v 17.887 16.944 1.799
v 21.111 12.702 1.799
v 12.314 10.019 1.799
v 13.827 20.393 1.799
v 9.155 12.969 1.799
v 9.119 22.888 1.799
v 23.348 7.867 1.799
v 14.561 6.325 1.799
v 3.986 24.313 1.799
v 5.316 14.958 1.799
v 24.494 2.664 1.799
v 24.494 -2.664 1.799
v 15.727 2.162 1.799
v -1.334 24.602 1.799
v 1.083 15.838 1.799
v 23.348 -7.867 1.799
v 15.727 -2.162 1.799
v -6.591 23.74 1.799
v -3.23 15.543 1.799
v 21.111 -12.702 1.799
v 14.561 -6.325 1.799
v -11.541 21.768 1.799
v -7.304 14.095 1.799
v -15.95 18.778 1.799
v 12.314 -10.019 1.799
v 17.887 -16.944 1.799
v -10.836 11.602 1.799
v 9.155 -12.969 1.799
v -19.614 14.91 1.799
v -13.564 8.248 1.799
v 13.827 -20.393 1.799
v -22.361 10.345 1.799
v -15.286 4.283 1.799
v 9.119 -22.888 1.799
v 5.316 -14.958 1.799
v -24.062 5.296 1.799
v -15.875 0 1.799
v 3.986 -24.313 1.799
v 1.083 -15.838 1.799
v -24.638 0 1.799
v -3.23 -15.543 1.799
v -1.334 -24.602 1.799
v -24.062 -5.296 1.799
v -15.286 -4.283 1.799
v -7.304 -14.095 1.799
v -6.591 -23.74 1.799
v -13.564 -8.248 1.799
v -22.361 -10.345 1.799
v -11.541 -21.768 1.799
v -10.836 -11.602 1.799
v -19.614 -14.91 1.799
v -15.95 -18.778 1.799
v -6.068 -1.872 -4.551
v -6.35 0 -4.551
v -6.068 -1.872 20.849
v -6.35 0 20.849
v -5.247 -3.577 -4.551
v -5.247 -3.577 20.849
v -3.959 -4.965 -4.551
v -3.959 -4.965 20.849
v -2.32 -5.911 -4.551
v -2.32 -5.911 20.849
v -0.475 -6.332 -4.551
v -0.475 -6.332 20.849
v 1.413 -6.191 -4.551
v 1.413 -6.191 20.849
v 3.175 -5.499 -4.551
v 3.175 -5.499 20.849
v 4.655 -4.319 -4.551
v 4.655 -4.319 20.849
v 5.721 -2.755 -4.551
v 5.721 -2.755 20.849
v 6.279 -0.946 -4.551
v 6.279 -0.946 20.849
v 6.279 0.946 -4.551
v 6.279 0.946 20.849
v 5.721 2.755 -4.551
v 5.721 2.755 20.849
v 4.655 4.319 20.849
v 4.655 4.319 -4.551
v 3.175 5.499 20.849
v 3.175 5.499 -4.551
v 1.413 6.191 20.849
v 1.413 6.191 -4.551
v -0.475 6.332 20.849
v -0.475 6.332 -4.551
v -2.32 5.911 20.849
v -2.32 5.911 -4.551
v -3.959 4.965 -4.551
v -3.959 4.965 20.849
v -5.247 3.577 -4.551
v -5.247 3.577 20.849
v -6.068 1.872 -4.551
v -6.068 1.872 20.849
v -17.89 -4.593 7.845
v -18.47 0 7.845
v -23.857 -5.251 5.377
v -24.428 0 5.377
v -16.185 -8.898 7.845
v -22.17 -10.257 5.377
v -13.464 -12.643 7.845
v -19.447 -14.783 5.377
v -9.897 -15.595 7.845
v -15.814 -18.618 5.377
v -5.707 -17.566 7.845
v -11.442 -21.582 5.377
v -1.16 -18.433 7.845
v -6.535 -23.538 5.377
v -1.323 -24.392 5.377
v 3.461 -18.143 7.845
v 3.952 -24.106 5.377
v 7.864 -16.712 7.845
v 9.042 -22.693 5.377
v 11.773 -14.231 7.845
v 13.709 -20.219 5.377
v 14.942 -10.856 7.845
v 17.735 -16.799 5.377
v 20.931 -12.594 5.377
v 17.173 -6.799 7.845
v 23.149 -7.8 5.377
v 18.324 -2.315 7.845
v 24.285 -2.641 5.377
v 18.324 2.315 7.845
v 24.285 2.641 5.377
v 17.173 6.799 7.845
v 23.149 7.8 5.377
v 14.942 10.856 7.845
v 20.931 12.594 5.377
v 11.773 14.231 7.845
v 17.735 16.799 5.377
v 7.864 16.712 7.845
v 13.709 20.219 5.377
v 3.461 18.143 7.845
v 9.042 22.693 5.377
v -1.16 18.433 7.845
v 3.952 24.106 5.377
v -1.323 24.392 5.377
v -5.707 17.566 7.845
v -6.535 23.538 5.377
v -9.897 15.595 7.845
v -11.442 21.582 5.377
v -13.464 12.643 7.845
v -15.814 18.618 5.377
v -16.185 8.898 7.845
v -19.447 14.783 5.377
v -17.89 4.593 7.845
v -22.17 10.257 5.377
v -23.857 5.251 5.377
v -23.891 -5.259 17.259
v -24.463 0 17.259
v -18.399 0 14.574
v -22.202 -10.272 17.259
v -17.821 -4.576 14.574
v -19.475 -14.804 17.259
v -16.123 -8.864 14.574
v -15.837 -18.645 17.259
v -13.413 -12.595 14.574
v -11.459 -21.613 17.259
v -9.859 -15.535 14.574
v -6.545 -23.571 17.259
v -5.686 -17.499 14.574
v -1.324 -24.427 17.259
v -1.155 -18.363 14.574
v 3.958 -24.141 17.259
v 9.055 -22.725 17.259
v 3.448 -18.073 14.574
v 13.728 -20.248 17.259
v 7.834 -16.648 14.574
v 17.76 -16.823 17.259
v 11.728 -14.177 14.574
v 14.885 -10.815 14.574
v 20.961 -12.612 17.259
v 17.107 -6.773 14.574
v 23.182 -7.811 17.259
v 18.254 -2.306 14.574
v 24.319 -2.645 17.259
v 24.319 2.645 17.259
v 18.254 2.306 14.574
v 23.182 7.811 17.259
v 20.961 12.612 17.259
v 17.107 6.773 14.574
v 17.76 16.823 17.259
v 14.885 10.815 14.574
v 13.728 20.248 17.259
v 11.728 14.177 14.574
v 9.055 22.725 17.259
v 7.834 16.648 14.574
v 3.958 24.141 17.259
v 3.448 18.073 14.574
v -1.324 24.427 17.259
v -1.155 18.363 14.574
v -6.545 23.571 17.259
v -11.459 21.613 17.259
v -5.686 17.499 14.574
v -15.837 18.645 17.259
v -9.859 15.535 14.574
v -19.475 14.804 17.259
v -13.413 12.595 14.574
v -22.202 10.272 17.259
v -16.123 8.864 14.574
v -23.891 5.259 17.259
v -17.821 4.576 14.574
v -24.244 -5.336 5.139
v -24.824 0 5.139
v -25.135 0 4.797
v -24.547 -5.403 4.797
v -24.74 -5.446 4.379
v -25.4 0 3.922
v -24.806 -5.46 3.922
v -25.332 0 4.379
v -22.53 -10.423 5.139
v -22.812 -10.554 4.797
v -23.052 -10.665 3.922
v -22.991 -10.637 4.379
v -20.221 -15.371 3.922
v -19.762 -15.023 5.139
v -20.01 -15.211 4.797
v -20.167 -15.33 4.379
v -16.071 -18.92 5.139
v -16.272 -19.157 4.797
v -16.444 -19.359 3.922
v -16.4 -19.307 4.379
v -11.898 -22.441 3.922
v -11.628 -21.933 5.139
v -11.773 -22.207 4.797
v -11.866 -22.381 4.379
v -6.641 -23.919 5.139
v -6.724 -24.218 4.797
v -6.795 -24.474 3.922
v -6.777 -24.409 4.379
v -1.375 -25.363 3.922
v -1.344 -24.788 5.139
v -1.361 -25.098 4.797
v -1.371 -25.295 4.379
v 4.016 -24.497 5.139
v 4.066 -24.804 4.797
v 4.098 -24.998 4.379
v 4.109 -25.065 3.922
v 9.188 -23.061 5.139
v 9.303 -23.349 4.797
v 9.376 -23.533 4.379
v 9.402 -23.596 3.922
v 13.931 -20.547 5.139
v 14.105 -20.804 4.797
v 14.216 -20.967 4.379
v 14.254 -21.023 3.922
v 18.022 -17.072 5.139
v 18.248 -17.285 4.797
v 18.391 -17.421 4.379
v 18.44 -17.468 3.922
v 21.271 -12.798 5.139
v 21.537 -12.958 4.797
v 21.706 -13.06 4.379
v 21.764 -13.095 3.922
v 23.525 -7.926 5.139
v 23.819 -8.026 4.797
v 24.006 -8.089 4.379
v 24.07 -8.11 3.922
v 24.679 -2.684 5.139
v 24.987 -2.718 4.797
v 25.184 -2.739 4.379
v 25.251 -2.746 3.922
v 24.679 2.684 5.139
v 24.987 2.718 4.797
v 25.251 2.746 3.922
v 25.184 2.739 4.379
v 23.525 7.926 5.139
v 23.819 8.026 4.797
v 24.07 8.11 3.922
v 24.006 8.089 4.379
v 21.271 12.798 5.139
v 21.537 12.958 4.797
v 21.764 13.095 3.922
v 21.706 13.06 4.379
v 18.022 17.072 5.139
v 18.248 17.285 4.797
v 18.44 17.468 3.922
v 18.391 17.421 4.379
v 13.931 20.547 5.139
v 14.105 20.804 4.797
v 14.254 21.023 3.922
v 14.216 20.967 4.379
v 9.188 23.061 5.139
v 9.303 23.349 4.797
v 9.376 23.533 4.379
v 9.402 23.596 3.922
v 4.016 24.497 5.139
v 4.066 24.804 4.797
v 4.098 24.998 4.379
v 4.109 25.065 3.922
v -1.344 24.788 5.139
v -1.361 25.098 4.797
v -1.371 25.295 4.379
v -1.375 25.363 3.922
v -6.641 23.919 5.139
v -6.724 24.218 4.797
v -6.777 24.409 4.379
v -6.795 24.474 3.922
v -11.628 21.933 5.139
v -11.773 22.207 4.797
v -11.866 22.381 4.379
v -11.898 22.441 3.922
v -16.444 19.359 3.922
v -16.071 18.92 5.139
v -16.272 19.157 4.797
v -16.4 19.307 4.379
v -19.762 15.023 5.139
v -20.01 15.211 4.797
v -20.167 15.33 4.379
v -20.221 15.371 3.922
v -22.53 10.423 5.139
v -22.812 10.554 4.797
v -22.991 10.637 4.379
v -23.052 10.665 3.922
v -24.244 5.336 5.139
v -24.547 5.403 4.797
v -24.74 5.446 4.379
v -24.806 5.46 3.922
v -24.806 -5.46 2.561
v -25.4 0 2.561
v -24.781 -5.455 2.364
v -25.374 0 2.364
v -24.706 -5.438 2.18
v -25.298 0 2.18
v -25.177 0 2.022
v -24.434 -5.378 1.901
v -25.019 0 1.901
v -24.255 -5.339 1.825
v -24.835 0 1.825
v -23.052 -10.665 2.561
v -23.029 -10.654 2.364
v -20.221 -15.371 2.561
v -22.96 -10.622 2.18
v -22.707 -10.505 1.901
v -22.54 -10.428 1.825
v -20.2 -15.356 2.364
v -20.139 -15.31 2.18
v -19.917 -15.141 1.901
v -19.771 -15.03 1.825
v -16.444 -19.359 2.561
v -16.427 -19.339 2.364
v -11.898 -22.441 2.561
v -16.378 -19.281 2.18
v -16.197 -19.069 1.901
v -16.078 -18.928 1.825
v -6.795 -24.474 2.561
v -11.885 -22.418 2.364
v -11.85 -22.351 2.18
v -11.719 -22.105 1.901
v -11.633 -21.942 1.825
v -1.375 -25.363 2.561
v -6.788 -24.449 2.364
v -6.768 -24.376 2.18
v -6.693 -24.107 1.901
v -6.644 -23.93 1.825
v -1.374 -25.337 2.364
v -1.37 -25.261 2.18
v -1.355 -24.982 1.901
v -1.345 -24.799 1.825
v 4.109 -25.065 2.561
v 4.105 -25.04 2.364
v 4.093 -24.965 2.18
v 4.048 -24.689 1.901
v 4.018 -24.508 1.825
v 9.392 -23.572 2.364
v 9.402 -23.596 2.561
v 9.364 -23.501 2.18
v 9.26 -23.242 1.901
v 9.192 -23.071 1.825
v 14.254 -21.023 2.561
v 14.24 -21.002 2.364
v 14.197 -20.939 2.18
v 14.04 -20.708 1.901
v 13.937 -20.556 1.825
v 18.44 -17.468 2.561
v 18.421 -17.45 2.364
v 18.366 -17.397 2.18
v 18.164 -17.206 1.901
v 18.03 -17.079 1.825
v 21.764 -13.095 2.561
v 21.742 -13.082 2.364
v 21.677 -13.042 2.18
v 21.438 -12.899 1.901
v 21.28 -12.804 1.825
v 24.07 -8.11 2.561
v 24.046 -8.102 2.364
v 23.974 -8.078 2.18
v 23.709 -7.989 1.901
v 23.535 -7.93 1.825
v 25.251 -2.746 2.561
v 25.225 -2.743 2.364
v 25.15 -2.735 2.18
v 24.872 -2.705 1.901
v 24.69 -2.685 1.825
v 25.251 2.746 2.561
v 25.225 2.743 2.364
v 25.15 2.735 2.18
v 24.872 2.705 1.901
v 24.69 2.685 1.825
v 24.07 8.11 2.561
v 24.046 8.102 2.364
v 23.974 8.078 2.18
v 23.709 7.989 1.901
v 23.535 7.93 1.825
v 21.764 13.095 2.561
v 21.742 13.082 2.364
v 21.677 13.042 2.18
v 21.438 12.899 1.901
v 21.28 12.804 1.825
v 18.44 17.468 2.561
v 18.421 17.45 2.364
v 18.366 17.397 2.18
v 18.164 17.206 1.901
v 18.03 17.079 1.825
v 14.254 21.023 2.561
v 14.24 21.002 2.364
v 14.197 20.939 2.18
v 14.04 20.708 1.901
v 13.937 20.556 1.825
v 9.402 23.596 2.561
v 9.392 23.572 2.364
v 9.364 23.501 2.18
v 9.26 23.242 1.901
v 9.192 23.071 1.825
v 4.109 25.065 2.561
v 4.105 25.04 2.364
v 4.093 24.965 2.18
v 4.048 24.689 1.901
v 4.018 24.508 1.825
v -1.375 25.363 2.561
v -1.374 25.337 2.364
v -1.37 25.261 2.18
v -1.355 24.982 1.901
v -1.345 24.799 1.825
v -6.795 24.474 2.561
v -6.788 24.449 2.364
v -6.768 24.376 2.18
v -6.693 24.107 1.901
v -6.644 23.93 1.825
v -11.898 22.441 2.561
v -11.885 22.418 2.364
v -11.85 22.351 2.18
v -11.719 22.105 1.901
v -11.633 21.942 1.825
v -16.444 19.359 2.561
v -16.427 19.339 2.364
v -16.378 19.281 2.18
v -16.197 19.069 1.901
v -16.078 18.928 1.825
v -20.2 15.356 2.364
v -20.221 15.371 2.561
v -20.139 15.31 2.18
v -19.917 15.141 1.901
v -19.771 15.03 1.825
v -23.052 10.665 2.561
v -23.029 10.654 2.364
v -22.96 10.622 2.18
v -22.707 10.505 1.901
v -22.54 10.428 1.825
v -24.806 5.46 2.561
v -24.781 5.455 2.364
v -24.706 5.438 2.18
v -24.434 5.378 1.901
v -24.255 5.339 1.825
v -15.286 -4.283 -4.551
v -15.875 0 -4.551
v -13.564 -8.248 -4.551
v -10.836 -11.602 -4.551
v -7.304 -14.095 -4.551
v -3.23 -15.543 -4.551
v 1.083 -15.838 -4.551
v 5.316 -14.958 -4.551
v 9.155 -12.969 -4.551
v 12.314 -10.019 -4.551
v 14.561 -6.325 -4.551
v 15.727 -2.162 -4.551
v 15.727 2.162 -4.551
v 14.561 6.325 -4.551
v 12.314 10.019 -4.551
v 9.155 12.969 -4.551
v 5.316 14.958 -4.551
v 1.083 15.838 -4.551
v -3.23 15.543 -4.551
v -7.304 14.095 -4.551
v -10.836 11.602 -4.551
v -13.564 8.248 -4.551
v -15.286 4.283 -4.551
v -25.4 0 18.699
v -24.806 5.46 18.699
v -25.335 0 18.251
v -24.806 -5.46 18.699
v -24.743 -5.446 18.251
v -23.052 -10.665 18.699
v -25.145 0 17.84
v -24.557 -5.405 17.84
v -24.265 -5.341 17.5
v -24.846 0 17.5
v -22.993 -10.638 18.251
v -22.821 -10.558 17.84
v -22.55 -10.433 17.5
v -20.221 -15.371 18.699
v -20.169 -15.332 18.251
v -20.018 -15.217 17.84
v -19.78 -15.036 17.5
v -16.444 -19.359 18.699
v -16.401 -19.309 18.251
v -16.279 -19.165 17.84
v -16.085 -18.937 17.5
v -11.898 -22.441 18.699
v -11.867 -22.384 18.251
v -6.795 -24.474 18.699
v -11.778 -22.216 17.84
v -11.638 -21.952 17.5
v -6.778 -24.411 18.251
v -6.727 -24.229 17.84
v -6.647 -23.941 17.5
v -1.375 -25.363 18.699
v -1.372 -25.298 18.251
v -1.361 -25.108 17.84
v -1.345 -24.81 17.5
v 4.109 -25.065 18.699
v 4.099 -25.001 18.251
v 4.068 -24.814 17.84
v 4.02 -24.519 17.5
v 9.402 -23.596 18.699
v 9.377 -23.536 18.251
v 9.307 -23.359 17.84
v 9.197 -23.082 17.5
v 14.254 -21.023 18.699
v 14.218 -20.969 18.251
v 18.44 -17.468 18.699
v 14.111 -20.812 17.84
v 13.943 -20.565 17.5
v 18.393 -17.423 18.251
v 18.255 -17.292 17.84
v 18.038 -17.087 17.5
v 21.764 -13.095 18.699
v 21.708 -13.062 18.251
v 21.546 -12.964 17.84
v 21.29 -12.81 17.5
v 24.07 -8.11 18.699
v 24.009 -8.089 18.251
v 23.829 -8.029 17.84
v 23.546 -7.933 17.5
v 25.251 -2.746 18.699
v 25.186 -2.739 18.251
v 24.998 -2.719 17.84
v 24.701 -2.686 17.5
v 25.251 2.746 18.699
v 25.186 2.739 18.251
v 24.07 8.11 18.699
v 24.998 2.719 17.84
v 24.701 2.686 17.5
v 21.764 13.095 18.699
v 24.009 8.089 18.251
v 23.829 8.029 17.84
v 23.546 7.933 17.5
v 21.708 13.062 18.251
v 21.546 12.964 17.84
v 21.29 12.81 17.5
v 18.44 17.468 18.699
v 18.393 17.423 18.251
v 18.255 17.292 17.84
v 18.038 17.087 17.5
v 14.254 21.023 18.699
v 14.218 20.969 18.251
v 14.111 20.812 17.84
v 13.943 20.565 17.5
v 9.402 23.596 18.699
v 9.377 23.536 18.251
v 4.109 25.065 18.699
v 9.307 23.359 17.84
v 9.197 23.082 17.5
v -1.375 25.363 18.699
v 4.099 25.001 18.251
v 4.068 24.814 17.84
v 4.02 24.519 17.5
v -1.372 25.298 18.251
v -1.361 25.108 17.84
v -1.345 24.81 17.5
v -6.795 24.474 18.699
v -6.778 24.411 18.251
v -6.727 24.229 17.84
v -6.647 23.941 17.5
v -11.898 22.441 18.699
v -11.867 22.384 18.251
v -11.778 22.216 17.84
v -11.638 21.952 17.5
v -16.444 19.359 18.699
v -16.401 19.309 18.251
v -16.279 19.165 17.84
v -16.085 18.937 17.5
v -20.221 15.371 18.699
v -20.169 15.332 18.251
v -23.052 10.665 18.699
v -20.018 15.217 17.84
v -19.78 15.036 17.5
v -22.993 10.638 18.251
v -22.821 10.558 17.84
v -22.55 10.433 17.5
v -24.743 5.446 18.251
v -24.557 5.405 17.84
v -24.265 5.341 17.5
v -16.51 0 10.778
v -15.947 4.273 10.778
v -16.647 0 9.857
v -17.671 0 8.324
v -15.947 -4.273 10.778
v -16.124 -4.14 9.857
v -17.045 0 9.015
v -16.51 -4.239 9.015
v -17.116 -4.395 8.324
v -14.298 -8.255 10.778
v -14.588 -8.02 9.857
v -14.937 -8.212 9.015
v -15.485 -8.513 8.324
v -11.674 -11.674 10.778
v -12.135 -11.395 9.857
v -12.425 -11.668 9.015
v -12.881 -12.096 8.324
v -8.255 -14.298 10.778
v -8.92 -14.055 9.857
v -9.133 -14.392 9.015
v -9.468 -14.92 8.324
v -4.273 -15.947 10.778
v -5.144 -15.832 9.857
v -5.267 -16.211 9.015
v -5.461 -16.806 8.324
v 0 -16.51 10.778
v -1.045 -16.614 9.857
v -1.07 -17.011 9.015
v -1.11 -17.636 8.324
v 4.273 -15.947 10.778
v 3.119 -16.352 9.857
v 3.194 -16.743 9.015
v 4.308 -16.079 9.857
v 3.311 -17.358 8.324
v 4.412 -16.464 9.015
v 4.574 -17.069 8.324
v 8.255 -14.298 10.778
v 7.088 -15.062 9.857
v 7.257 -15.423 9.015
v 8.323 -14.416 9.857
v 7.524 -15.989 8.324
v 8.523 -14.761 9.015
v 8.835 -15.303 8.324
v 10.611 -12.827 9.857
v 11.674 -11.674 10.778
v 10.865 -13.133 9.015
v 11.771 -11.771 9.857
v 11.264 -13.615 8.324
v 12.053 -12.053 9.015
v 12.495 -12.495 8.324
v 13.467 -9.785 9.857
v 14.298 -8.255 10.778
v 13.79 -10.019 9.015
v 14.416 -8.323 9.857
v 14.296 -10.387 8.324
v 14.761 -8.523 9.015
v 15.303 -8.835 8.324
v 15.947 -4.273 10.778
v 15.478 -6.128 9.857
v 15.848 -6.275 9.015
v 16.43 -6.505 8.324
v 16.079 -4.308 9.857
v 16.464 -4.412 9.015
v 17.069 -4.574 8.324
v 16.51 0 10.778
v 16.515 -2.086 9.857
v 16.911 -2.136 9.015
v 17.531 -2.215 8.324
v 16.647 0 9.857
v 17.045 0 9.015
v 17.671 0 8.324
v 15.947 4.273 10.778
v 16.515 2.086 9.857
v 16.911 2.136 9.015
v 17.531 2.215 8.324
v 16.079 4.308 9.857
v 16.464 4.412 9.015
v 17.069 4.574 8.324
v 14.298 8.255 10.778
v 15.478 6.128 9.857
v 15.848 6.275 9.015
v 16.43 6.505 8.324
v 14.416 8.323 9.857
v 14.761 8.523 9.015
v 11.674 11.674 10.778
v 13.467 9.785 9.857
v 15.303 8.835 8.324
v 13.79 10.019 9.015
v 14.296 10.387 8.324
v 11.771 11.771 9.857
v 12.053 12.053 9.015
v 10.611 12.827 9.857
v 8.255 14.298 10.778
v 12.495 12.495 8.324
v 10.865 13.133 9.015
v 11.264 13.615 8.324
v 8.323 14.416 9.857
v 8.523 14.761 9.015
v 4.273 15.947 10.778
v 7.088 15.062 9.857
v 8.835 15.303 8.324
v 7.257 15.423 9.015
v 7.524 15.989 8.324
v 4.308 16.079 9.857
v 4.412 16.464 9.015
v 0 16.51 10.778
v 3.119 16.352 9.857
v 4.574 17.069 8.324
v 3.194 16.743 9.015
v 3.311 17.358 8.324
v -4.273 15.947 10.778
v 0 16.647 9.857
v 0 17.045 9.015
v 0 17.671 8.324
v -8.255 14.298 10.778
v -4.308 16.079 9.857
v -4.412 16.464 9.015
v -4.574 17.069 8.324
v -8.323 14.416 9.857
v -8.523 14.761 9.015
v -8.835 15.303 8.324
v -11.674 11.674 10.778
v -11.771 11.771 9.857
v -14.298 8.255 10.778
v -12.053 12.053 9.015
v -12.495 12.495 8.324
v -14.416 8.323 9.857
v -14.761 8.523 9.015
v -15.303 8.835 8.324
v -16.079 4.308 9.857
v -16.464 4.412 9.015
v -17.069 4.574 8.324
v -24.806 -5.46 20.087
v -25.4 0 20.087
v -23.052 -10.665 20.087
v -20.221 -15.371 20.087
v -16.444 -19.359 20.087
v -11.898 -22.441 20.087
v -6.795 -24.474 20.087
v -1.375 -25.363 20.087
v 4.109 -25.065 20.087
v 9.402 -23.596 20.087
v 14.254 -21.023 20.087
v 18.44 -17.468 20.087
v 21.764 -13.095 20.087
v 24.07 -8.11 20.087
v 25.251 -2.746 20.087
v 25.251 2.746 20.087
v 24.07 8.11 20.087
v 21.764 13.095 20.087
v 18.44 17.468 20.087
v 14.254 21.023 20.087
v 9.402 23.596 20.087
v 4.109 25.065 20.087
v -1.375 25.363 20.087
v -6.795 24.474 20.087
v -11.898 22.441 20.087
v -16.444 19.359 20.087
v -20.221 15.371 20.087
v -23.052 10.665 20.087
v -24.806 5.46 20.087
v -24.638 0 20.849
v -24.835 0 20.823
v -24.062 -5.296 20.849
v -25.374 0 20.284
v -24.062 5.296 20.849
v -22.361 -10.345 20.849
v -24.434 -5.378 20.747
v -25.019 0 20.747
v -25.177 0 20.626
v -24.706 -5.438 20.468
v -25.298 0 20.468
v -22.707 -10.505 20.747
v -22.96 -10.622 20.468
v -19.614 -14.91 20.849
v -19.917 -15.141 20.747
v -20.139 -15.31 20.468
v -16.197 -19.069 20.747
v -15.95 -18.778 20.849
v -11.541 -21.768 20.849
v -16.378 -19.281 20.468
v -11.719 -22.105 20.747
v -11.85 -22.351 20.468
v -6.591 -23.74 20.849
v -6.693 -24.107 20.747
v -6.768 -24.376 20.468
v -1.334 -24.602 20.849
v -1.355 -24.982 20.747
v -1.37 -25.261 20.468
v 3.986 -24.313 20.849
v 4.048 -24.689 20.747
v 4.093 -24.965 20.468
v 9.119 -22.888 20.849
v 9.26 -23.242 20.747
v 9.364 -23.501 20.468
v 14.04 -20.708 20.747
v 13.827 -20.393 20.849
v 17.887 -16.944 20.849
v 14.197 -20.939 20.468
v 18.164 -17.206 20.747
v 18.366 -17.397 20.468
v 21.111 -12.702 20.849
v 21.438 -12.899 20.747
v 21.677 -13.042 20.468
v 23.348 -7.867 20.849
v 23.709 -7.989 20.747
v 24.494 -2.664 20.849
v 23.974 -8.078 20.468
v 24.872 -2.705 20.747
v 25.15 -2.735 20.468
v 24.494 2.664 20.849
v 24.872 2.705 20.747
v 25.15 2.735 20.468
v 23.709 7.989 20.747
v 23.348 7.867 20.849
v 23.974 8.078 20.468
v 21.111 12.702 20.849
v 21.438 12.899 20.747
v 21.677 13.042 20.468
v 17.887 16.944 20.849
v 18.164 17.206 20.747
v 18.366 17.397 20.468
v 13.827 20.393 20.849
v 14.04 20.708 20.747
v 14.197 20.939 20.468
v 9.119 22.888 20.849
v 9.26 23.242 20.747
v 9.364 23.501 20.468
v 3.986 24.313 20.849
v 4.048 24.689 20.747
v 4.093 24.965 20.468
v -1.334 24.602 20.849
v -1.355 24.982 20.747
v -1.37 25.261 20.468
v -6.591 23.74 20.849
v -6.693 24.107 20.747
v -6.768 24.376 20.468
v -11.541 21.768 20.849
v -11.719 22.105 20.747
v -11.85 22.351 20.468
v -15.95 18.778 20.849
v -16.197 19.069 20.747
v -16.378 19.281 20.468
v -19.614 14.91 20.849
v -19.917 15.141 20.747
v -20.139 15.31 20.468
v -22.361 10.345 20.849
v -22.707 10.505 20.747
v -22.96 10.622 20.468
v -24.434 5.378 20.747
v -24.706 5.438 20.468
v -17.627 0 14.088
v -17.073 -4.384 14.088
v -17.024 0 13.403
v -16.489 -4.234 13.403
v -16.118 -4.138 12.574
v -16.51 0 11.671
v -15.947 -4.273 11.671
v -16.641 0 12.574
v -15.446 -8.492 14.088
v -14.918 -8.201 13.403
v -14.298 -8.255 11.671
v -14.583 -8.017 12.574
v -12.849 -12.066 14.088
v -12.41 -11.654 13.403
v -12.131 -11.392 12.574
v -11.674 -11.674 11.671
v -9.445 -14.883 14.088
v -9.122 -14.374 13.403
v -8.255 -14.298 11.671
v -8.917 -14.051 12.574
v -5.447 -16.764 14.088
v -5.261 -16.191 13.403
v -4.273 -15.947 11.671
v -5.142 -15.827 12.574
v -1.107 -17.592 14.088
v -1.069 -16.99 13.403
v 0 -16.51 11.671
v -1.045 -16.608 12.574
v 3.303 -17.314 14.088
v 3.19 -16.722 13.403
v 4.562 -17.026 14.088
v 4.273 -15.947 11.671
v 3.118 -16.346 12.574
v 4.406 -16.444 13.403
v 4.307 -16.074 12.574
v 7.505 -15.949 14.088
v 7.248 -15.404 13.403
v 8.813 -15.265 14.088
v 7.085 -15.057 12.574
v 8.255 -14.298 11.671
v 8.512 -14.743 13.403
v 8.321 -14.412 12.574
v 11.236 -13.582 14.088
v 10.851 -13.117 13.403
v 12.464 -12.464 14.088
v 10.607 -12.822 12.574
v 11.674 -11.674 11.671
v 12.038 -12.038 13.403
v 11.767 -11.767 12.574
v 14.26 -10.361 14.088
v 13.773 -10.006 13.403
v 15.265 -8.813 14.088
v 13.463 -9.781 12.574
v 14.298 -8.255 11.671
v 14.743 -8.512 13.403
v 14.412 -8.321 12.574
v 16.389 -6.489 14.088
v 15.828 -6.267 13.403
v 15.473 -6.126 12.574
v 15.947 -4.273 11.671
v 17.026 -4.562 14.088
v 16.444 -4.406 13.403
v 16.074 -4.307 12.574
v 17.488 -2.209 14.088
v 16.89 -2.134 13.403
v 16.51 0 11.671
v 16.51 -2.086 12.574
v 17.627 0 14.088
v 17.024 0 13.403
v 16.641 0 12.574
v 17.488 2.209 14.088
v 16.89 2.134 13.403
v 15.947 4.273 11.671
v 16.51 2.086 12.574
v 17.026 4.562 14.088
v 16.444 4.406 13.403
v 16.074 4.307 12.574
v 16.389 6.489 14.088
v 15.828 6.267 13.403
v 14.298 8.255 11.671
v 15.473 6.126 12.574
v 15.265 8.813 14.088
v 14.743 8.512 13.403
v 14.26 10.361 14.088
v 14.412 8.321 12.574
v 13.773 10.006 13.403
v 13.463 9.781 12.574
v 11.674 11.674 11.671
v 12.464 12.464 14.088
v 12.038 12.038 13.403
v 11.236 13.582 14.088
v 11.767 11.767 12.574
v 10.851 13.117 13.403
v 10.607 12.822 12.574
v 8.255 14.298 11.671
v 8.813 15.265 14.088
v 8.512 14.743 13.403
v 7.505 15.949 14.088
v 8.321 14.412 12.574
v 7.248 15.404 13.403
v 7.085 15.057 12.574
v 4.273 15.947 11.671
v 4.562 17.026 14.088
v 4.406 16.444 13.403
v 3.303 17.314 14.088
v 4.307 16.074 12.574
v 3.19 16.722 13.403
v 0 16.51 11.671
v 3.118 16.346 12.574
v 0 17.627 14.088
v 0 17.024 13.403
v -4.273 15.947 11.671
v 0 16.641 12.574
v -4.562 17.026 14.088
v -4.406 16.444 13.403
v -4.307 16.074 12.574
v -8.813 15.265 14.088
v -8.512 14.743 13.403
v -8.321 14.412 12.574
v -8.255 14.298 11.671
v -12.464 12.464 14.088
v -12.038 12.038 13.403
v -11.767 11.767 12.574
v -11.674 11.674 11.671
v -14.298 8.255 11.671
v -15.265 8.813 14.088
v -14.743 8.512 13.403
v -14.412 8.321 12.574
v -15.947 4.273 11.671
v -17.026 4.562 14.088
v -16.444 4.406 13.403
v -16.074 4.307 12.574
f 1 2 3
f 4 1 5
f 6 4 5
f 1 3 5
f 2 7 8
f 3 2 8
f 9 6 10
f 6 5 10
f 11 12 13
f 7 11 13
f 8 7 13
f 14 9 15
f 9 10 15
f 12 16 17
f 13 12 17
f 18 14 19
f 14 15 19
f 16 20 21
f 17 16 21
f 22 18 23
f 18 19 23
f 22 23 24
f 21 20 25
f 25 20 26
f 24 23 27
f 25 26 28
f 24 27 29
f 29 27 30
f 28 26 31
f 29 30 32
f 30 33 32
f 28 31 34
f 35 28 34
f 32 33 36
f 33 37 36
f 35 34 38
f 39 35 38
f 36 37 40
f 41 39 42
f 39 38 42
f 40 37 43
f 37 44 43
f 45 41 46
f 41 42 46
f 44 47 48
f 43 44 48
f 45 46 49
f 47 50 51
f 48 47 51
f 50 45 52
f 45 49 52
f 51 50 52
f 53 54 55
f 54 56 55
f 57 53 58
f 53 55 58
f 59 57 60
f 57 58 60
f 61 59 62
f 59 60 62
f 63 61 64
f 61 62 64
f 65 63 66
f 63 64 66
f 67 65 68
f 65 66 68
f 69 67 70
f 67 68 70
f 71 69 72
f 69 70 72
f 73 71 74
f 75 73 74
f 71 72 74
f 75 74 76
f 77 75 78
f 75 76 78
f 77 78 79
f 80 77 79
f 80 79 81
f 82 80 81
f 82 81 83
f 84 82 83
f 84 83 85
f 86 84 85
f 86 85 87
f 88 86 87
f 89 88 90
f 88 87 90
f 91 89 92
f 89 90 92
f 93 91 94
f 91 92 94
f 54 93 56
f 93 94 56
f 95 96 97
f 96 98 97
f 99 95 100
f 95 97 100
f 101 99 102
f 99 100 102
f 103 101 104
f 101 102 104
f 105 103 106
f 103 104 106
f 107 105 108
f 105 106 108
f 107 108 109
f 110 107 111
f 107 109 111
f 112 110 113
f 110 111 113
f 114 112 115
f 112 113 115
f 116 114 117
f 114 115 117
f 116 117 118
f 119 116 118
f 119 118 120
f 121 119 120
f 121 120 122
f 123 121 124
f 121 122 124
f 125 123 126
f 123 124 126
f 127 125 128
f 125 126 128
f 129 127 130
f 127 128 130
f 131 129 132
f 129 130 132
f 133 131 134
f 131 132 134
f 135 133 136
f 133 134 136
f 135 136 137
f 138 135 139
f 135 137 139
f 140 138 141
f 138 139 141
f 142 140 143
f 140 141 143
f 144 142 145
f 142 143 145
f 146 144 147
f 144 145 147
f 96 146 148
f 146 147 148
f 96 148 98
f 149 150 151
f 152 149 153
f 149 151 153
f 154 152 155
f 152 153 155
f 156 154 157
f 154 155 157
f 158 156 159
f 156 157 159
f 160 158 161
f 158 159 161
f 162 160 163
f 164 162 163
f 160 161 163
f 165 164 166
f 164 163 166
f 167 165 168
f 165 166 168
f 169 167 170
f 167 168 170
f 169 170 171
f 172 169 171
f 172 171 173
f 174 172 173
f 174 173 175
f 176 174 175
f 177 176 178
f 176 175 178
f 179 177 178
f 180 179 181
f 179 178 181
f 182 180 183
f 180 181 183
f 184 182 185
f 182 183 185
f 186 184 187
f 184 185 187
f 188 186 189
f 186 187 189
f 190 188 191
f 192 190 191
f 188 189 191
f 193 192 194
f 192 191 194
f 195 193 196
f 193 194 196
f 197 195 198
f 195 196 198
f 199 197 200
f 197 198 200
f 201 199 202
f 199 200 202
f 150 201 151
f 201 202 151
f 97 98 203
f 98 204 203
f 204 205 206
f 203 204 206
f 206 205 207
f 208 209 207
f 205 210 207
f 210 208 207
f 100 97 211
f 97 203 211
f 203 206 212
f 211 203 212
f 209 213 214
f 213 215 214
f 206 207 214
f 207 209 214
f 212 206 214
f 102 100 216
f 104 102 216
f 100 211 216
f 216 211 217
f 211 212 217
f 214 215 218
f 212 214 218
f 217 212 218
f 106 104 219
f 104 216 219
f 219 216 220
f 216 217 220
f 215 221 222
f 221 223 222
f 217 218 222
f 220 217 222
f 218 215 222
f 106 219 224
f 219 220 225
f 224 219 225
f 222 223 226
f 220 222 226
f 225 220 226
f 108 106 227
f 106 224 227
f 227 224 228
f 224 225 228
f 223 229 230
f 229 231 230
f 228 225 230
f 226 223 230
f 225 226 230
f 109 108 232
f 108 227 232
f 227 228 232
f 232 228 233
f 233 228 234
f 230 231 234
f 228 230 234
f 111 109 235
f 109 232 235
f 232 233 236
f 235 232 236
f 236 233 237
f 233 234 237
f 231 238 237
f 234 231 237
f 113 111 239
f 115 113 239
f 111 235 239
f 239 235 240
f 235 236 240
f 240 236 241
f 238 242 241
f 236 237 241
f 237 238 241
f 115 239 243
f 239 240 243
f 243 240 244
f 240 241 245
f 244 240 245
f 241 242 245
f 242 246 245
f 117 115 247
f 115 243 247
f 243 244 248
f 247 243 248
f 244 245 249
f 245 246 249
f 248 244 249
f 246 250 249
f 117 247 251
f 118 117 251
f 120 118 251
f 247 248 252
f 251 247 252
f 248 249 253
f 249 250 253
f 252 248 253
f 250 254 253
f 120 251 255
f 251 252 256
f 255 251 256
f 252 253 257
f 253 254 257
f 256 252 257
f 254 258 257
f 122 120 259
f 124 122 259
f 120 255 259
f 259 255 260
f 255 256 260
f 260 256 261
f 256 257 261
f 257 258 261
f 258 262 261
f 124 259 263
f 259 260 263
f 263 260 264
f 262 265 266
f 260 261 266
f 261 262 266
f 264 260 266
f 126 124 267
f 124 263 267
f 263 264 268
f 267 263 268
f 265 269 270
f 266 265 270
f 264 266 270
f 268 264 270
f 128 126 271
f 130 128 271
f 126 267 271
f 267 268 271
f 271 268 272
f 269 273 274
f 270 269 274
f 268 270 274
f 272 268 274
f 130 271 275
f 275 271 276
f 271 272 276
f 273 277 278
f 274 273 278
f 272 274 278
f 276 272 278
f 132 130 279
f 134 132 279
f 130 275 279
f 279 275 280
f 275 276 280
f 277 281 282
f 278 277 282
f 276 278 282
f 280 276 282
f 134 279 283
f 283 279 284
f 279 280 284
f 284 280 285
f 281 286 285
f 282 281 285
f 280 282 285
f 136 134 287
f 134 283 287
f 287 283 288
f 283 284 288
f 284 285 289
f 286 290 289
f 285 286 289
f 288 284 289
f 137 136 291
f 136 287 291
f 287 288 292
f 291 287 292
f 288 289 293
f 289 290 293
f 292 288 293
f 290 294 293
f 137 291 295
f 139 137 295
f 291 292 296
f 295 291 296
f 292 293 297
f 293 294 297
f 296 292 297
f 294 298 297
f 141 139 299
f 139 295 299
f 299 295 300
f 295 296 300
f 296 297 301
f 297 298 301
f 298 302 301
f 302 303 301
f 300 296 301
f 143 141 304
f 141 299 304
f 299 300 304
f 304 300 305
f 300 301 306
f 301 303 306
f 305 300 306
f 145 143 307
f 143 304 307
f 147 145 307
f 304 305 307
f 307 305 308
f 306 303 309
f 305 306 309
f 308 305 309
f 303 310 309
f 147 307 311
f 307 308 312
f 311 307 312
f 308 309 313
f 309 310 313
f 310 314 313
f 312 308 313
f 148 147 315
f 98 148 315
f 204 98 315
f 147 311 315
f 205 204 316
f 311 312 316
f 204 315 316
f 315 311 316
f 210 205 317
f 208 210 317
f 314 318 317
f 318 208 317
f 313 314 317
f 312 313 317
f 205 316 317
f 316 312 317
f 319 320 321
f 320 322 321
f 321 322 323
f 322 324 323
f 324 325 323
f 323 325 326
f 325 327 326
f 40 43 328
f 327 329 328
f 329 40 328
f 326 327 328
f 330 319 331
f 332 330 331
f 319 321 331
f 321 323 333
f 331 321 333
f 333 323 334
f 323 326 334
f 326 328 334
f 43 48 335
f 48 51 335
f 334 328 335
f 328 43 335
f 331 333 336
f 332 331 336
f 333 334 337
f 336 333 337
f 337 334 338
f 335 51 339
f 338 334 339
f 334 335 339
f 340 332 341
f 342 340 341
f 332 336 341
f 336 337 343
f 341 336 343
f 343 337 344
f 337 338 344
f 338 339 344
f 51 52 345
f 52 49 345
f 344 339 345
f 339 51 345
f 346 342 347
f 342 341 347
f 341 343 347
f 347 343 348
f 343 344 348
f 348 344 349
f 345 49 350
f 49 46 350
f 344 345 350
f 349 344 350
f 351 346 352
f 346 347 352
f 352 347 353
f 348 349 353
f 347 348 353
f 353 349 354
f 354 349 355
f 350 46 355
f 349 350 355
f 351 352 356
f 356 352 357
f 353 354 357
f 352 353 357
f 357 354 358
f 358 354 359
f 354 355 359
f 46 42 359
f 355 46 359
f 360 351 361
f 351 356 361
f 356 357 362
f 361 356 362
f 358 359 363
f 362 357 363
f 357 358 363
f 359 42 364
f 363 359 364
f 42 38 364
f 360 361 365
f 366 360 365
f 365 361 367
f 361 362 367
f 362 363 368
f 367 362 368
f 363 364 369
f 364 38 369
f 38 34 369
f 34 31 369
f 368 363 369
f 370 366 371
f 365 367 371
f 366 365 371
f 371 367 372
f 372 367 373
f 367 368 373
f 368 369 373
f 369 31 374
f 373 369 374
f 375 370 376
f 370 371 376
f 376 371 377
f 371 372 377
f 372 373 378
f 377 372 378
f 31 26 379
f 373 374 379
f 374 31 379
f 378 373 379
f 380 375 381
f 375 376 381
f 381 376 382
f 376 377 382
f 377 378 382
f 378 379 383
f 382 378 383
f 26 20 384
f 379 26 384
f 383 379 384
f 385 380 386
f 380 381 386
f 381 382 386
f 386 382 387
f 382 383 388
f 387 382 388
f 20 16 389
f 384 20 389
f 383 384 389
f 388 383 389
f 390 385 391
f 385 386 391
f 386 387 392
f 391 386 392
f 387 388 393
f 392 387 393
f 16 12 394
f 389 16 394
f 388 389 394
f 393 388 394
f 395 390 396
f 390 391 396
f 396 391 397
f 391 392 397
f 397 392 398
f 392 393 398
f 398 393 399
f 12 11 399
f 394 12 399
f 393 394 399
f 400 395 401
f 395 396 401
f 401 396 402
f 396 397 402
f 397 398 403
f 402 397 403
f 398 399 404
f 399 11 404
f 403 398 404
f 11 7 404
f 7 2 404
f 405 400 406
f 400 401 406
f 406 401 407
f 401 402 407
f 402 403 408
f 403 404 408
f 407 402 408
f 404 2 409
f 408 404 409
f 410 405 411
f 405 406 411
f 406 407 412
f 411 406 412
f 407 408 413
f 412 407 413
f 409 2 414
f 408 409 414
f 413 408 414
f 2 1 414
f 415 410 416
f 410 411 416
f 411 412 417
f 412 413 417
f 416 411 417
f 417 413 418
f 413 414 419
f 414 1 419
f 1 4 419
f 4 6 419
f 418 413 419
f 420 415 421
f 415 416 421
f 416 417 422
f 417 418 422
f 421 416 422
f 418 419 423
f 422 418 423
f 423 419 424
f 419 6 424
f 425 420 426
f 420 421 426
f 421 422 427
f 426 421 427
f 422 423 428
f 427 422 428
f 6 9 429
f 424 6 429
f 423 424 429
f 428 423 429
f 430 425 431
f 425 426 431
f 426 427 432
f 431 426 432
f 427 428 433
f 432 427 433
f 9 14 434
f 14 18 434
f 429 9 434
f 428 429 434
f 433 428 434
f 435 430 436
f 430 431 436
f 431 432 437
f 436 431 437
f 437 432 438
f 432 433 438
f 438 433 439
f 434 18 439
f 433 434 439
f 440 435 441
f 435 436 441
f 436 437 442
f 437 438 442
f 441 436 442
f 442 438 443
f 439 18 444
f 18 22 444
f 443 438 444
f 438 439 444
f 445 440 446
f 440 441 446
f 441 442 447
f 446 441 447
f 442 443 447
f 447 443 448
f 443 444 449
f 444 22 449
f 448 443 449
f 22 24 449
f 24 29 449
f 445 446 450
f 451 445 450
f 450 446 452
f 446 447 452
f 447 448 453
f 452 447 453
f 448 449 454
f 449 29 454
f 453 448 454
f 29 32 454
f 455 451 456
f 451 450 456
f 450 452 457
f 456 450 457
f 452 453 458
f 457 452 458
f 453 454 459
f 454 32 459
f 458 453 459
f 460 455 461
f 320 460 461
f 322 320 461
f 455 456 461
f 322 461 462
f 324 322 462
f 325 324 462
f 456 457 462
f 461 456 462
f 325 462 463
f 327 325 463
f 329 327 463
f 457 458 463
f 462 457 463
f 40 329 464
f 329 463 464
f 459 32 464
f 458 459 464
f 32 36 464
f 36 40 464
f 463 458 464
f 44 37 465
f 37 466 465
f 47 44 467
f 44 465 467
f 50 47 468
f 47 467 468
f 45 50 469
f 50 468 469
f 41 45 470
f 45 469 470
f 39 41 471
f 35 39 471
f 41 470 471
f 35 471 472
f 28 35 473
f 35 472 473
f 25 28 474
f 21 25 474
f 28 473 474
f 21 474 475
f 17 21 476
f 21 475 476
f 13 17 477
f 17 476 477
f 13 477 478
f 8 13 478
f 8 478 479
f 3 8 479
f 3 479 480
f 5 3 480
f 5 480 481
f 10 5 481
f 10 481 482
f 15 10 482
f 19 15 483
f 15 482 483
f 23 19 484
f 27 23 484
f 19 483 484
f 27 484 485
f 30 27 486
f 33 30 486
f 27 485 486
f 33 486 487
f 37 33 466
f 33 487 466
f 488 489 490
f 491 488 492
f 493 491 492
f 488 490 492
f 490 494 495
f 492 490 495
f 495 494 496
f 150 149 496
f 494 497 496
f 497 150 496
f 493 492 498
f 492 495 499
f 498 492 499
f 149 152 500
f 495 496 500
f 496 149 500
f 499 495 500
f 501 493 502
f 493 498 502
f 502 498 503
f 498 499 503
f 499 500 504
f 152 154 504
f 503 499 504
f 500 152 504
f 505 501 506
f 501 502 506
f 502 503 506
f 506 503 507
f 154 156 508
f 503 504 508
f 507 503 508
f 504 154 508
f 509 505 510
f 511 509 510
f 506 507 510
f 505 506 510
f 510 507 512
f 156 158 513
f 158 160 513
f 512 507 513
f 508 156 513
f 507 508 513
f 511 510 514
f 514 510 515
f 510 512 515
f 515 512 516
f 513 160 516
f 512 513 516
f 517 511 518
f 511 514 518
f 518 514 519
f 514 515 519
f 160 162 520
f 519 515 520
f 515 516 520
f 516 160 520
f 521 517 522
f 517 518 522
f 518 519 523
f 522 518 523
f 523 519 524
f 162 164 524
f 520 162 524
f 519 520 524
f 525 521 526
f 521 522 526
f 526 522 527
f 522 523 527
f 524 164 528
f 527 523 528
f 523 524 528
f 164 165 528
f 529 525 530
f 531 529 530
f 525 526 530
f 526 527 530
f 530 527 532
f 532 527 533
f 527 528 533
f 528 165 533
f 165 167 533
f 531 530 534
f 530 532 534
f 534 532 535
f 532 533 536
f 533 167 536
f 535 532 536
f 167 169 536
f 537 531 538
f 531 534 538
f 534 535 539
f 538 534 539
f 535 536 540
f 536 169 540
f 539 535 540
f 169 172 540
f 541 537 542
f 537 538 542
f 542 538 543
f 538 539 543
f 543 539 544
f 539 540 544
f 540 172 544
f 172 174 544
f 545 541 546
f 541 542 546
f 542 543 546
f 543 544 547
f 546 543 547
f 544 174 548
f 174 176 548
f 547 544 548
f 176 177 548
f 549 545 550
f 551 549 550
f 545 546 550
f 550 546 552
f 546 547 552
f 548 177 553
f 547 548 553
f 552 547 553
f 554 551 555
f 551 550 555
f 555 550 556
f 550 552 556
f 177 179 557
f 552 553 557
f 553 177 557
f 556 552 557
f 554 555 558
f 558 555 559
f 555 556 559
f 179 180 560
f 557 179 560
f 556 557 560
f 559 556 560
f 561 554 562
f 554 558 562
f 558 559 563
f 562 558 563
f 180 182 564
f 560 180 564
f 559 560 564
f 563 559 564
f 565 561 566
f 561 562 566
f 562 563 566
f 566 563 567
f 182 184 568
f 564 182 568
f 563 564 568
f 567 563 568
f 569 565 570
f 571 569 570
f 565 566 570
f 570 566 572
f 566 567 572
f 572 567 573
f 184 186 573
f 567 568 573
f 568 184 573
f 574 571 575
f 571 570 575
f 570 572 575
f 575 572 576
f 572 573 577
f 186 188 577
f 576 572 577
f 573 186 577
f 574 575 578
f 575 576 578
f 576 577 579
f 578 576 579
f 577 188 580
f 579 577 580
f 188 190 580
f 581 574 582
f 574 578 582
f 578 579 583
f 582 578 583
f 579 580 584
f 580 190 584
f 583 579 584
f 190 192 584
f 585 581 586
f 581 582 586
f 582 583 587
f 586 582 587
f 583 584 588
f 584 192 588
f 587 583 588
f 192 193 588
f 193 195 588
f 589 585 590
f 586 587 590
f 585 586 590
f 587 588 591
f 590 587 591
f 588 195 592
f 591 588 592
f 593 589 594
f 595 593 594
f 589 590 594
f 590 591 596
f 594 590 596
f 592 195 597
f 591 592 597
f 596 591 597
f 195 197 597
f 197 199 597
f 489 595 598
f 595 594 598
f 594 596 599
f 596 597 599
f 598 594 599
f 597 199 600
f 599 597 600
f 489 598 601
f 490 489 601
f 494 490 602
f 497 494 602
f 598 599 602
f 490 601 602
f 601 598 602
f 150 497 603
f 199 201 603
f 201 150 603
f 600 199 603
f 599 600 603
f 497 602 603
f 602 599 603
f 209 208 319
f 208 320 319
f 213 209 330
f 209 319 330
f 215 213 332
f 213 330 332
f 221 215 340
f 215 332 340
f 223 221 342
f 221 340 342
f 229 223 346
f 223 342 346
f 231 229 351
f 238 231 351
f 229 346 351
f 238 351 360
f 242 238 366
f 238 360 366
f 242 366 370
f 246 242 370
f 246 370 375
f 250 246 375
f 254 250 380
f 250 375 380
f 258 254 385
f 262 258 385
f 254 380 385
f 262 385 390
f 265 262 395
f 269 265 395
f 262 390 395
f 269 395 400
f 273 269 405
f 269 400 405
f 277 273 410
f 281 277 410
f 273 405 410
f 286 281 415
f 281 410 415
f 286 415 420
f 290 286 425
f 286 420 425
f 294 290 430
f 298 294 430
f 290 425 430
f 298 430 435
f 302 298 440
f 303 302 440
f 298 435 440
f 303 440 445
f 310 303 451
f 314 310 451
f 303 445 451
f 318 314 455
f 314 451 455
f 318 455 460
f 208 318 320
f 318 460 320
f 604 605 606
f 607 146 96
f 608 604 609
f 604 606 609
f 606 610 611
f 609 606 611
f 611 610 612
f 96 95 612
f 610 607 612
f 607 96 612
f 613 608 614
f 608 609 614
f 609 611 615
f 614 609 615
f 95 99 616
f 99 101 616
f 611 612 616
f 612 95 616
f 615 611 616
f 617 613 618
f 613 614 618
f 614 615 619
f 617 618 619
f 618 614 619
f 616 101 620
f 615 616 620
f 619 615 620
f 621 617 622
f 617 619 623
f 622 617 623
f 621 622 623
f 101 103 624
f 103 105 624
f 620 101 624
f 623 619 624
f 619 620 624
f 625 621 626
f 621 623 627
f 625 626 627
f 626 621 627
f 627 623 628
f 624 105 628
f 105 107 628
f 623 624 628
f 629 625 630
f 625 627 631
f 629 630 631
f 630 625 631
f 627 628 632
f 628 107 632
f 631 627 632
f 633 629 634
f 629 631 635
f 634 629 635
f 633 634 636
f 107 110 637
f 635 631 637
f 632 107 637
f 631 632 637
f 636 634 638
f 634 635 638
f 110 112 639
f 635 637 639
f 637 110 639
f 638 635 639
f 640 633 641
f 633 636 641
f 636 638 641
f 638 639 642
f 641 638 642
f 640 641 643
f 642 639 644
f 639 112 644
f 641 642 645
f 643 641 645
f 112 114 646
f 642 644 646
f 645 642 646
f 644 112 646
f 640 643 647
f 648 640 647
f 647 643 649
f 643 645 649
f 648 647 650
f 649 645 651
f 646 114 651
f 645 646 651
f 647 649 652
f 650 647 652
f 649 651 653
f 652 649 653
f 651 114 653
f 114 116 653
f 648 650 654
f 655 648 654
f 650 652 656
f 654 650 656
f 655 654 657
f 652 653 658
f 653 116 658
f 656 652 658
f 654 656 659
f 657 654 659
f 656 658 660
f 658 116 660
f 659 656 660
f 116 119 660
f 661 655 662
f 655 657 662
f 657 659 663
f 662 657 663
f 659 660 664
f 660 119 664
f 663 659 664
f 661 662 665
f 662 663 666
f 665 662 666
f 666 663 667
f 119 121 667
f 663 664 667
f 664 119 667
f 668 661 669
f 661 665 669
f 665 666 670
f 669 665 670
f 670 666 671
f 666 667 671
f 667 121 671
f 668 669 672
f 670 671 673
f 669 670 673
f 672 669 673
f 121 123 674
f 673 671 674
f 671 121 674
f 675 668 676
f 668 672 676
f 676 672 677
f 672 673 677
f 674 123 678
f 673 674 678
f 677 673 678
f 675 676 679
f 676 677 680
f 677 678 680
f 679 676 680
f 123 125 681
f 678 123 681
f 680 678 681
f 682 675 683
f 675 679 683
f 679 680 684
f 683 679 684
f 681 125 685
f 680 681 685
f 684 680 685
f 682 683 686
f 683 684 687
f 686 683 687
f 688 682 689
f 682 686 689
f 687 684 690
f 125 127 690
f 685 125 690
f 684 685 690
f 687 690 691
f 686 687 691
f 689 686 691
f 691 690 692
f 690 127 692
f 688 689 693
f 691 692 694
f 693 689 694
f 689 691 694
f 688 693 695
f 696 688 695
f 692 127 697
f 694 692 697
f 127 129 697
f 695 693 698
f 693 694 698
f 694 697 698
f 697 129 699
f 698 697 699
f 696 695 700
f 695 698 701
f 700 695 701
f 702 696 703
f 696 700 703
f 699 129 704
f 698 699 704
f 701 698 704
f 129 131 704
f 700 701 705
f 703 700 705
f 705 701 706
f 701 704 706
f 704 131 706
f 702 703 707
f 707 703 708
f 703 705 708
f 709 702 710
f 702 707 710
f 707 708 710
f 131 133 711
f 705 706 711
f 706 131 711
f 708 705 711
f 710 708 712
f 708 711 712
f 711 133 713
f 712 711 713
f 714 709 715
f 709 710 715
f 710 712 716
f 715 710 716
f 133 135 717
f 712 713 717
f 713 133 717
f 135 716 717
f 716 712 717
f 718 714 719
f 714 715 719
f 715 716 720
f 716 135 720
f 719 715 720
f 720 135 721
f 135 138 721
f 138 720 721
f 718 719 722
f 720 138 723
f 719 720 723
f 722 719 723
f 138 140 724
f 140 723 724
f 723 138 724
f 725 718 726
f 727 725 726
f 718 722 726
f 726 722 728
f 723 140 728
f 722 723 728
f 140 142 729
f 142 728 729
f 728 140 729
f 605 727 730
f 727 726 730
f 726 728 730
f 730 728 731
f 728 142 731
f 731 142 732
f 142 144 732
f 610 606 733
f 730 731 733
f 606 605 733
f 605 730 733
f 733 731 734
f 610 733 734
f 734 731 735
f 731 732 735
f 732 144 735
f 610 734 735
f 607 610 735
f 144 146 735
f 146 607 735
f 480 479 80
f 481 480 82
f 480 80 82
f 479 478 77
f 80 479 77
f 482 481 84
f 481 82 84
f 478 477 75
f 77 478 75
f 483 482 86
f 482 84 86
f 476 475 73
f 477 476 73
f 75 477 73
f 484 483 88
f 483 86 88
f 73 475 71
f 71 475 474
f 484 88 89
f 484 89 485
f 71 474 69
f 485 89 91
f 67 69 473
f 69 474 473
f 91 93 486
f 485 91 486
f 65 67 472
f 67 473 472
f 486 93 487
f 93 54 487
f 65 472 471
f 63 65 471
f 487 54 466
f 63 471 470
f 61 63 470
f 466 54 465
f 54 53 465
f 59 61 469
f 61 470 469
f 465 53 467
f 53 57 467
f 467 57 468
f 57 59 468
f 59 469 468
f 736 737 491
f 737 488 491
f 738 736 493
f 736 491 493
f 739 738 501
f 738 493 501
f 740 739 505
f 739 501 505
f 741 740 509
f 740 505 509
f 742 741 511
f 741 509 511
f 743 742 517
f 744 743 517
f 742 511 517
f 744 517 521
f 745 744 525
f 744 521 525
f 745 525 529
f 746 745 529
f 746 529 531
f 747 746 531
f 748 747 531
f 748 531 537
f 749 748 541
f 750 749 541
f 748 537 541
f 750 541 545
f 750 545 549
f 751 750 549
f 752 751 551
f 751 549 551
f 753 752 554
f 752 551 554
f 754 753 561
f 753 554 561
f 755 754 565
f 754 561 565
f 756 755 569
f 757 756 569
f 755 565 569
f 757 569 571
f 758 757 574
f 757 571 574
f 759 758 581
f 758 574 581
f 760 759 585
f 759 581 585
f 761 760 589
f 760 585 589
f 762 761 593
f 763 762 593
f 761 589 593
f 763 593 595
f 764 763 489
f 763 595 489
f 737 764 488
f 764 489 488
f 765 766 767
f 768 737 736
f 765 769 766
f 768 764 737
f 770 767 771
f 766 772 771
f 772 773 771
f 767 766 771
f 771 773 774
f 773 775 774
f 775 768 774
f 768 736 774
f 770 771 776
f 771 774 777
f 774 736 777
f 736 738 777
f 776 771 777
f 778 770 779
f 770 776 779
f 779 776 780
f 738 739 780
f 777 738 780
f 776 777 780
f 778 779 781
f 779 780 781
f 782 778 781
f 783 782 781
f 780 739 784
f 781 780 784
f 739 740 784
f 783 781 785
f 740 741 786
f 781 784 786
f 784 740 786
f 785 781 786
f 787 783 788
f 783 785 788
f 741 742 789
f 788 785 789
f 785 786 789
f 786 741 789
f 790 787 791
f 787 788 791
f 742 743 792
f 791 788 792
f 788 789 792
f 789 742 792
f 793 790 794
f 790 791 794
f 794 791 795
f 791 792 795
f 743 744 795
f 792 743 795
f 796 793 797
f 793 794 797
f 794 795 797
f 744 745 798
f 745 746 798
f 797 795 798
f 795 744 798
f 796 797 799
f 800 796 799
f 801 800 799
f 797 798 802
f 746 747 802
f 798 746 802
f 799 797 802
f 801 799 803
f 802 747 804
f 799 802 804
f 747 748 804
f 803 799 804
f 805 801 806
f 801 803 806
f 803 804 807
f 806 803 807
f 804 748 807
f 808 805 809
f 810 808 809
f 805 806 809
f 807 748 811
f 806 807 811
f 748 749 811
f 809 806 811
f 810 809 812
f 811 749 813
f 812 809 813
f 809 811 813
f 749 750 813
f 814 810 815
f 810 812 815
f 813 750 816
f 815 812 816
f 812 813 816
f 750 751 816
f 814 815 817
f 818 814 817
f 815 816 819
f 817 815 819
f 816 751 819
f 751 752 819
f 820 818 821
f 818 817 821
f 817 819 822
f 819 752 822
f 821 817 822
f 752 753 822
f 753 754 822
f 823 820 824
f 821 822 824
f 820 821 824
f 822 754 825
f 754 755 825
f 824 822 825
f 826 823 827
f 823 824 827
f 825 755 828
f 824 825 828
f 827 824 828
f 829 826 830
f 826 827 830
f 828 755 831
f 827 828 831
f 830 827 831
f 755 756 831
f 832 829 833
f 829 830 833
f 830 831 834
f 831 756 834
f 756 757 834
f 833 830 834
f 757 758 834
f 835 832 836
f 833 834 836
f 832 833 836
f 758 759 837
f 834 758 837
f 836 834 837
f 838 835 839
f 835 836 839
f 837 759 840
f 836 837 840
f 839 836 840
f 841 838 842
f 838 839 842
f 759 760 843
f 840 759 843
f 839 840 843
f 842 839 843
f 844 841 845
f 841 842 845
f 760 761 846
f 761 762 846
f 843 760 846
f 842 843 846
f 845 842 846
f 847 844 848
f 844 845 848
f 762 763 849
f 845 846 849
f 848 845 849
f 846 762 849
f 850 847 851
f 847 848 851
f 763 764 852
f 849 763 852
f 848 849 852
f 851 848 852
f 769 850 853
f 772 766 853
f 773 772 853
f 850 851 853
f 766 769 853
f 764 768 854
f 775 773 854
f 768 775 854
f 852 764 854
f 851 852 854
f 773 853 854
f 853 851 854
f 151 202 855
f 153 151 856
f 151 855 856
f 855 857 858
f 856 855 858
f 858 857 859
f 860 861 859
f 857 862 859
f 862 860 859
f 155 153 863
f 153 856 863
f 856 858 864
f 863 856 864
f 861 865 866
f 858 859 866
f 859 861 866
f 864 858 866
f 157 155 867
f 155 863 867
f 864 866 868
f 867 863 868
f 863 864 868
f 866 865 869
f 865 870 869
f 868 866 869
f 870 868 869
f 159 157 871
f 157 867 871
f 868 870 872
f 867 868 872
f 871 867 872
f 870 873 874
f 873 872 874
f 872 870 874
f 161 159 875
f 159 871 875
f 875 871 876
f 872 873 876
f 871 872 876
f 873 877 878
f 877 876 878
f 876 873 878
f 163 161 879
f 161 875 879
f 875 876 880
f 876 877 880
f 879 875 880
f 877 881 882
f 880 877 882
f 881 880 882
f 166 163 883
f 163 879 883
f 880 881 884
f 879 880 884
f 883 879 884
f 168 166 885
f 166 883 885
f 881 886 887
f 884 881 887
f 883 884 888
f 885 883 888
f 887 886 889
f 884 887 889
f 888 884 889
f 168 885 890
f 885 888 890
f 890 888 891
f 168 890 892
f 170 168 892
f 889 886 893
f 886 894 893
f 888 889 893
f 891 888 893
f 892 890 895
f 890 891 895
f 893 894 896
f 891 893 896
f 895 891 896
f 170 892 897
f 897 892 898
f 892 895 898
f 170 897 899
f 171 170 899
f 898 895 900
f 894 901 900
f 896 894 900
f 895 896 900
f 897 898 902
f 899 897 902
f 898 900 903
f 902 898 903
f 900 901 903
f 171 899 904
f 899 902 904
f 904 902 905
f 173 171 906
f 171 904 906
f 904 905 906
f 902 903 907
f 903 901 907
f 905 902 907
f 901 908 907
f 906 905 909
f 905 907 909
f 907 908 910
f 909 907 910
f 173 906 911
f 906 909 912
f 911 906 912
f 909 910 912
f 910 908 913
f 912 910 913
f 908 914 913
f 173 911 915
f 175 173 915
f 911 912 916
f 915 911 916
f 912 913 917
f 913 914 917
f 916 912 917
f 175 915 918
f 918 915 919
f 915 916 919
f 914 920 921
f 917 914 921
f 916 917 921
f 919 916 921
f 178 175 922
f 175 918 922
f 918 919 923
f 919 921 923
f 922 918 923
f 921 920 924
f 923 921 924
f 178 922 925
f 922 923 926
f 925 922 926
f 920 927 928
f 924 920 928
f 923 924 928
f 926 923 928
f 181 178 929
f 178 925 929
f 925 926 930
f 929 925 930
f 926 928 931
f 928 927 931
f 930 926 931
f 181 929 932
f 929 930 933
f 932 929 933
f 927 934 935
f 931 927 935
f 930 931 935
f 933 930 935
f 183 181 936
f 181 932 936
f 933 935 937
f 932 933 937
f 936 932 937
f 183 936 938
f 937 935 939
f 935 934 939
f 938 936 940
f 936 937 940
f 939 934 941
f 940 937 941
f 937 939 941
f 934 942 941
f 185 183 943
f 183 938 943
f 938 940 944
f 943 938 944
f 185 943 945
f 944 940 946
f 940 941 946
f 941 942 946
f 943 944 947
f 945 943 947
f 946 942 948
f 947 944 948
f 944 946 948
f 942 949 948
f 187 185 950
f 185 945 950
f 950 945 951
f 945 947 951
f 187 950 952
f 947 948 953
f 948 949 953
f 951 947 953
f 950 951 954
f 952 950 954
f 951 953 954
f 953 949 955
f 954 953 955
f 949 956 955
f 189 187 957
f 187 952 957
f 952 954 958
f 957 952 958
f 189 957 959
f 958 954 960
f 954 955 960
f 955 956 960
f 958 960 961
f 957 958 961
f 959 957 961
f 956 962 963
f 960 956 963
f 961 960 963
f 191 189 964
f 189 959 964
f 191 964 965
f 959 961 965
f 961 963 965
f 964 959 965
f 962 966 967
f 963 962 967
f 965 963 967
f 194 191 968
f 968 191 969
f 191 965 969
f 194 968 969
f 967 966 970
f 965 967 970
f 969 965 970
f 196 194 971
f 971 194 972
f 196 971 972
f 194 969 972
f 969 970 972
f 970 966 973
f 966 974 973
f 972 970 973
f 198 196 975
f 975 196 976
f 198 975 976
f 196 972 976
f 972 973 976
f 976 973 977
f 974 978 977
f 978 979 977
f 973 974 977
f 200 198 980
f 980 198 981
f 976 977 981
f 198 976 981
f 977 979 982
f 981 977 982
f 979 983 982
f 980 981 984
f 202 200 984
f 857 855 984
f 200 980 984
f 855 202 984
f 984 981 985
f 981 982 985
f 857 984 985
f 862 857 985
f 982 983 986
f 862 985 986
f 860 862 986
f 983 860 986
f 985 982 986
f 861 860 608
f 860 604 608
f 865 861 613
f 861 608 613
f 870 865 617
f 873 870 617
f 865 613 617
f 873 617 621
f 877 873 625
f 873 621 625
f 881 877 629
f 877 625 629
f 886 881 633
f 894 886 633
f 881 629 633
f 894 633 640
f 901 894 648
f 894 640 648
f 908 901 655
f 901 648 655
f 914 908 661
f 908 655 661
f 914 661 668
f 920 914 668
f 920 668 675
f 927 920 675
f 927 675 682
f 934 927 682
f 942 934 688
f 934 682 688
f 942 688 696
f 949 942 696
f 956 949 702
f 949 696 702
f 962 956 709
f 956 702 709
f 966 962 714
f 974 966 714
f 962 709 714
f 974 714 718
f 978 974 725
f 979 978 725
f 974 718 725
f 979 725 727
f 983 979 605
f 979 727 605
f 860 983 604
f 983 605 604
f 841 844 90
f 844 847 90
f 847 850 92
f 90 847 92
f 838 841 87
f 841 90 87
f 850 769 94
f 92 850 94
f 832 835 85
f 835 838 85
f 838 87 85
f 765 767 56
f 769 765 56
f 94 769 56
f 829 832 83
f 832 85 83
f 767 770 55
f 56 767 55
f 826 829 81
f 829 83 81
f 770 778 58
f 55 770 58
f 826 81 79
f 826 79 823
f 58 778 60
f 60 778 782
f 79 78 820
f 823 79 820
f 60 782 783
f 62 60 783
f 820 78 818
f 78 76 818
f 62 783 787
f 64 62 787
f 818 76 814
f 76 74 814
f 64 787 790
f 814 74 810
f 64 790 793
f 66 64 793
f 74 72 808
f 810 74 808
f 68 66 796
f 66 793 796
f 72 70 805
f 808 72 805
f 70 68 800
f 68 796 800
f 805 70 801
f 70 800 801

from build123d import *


with BuildPart() as f1:
    # F0 (on Front) → F1 (revolve)
    with BuildSketch(Plane.XZ):
        with BuildLine():
            Line((-6.35, -4.550833), (-6.35, 20.849167))
            Line((-6.35, 20.849167), (-24.638, 20.849167))
            ThreePointArc((-24.638, 20.849167), (-25.176815, 20.625982), (-25.4, 20.087167))
            Line((-25.4, 20.087167), (-25.4, 18.699073))
            ThreePointArc((-25.4, 18.699073), (-25.145088, 17.840068), (-24.462878, 17.259156))
            Line((-24.462878, 17.259156), (-18.399359, 14.573883))
            ThreePointArc((-18.399359, 14.573883), (-17.023935, 13.402689), (-16.51, 11.670824))
            Line((-16.51, 11.670824), (-16.51, 10.778493))
            ThreePointArc((-16.51, 10.778493), (-17.04503, 9.014638), (-18.469799, 7.84525))
            Line((-18.469799, 7.84525), (-24.427939, 5.376878))
            ThreePointArc((-24.427939, 5.376878), (-25.134625, 4.796861), (-25.4, 3.921989))
            Line((-25.4, 3.921989), (-25.4, 2.561167))
            ThreePointArc((-25.4, 2.561167), (-25.176815, 2.022352), (-24.638, 1.799167))
            Line((-24.638, 1.799167), (-15.875, 1.799167))
            Line((-15.875, 1.799167), (-15.875, -4.550833))
            Line((-15.875, -4.550833), (-6.35, -4.550833))
        make_face()
    revolve(axis=Axis((0, 0, 0.052916), (0, 0, 1)))


solid = f1.part
